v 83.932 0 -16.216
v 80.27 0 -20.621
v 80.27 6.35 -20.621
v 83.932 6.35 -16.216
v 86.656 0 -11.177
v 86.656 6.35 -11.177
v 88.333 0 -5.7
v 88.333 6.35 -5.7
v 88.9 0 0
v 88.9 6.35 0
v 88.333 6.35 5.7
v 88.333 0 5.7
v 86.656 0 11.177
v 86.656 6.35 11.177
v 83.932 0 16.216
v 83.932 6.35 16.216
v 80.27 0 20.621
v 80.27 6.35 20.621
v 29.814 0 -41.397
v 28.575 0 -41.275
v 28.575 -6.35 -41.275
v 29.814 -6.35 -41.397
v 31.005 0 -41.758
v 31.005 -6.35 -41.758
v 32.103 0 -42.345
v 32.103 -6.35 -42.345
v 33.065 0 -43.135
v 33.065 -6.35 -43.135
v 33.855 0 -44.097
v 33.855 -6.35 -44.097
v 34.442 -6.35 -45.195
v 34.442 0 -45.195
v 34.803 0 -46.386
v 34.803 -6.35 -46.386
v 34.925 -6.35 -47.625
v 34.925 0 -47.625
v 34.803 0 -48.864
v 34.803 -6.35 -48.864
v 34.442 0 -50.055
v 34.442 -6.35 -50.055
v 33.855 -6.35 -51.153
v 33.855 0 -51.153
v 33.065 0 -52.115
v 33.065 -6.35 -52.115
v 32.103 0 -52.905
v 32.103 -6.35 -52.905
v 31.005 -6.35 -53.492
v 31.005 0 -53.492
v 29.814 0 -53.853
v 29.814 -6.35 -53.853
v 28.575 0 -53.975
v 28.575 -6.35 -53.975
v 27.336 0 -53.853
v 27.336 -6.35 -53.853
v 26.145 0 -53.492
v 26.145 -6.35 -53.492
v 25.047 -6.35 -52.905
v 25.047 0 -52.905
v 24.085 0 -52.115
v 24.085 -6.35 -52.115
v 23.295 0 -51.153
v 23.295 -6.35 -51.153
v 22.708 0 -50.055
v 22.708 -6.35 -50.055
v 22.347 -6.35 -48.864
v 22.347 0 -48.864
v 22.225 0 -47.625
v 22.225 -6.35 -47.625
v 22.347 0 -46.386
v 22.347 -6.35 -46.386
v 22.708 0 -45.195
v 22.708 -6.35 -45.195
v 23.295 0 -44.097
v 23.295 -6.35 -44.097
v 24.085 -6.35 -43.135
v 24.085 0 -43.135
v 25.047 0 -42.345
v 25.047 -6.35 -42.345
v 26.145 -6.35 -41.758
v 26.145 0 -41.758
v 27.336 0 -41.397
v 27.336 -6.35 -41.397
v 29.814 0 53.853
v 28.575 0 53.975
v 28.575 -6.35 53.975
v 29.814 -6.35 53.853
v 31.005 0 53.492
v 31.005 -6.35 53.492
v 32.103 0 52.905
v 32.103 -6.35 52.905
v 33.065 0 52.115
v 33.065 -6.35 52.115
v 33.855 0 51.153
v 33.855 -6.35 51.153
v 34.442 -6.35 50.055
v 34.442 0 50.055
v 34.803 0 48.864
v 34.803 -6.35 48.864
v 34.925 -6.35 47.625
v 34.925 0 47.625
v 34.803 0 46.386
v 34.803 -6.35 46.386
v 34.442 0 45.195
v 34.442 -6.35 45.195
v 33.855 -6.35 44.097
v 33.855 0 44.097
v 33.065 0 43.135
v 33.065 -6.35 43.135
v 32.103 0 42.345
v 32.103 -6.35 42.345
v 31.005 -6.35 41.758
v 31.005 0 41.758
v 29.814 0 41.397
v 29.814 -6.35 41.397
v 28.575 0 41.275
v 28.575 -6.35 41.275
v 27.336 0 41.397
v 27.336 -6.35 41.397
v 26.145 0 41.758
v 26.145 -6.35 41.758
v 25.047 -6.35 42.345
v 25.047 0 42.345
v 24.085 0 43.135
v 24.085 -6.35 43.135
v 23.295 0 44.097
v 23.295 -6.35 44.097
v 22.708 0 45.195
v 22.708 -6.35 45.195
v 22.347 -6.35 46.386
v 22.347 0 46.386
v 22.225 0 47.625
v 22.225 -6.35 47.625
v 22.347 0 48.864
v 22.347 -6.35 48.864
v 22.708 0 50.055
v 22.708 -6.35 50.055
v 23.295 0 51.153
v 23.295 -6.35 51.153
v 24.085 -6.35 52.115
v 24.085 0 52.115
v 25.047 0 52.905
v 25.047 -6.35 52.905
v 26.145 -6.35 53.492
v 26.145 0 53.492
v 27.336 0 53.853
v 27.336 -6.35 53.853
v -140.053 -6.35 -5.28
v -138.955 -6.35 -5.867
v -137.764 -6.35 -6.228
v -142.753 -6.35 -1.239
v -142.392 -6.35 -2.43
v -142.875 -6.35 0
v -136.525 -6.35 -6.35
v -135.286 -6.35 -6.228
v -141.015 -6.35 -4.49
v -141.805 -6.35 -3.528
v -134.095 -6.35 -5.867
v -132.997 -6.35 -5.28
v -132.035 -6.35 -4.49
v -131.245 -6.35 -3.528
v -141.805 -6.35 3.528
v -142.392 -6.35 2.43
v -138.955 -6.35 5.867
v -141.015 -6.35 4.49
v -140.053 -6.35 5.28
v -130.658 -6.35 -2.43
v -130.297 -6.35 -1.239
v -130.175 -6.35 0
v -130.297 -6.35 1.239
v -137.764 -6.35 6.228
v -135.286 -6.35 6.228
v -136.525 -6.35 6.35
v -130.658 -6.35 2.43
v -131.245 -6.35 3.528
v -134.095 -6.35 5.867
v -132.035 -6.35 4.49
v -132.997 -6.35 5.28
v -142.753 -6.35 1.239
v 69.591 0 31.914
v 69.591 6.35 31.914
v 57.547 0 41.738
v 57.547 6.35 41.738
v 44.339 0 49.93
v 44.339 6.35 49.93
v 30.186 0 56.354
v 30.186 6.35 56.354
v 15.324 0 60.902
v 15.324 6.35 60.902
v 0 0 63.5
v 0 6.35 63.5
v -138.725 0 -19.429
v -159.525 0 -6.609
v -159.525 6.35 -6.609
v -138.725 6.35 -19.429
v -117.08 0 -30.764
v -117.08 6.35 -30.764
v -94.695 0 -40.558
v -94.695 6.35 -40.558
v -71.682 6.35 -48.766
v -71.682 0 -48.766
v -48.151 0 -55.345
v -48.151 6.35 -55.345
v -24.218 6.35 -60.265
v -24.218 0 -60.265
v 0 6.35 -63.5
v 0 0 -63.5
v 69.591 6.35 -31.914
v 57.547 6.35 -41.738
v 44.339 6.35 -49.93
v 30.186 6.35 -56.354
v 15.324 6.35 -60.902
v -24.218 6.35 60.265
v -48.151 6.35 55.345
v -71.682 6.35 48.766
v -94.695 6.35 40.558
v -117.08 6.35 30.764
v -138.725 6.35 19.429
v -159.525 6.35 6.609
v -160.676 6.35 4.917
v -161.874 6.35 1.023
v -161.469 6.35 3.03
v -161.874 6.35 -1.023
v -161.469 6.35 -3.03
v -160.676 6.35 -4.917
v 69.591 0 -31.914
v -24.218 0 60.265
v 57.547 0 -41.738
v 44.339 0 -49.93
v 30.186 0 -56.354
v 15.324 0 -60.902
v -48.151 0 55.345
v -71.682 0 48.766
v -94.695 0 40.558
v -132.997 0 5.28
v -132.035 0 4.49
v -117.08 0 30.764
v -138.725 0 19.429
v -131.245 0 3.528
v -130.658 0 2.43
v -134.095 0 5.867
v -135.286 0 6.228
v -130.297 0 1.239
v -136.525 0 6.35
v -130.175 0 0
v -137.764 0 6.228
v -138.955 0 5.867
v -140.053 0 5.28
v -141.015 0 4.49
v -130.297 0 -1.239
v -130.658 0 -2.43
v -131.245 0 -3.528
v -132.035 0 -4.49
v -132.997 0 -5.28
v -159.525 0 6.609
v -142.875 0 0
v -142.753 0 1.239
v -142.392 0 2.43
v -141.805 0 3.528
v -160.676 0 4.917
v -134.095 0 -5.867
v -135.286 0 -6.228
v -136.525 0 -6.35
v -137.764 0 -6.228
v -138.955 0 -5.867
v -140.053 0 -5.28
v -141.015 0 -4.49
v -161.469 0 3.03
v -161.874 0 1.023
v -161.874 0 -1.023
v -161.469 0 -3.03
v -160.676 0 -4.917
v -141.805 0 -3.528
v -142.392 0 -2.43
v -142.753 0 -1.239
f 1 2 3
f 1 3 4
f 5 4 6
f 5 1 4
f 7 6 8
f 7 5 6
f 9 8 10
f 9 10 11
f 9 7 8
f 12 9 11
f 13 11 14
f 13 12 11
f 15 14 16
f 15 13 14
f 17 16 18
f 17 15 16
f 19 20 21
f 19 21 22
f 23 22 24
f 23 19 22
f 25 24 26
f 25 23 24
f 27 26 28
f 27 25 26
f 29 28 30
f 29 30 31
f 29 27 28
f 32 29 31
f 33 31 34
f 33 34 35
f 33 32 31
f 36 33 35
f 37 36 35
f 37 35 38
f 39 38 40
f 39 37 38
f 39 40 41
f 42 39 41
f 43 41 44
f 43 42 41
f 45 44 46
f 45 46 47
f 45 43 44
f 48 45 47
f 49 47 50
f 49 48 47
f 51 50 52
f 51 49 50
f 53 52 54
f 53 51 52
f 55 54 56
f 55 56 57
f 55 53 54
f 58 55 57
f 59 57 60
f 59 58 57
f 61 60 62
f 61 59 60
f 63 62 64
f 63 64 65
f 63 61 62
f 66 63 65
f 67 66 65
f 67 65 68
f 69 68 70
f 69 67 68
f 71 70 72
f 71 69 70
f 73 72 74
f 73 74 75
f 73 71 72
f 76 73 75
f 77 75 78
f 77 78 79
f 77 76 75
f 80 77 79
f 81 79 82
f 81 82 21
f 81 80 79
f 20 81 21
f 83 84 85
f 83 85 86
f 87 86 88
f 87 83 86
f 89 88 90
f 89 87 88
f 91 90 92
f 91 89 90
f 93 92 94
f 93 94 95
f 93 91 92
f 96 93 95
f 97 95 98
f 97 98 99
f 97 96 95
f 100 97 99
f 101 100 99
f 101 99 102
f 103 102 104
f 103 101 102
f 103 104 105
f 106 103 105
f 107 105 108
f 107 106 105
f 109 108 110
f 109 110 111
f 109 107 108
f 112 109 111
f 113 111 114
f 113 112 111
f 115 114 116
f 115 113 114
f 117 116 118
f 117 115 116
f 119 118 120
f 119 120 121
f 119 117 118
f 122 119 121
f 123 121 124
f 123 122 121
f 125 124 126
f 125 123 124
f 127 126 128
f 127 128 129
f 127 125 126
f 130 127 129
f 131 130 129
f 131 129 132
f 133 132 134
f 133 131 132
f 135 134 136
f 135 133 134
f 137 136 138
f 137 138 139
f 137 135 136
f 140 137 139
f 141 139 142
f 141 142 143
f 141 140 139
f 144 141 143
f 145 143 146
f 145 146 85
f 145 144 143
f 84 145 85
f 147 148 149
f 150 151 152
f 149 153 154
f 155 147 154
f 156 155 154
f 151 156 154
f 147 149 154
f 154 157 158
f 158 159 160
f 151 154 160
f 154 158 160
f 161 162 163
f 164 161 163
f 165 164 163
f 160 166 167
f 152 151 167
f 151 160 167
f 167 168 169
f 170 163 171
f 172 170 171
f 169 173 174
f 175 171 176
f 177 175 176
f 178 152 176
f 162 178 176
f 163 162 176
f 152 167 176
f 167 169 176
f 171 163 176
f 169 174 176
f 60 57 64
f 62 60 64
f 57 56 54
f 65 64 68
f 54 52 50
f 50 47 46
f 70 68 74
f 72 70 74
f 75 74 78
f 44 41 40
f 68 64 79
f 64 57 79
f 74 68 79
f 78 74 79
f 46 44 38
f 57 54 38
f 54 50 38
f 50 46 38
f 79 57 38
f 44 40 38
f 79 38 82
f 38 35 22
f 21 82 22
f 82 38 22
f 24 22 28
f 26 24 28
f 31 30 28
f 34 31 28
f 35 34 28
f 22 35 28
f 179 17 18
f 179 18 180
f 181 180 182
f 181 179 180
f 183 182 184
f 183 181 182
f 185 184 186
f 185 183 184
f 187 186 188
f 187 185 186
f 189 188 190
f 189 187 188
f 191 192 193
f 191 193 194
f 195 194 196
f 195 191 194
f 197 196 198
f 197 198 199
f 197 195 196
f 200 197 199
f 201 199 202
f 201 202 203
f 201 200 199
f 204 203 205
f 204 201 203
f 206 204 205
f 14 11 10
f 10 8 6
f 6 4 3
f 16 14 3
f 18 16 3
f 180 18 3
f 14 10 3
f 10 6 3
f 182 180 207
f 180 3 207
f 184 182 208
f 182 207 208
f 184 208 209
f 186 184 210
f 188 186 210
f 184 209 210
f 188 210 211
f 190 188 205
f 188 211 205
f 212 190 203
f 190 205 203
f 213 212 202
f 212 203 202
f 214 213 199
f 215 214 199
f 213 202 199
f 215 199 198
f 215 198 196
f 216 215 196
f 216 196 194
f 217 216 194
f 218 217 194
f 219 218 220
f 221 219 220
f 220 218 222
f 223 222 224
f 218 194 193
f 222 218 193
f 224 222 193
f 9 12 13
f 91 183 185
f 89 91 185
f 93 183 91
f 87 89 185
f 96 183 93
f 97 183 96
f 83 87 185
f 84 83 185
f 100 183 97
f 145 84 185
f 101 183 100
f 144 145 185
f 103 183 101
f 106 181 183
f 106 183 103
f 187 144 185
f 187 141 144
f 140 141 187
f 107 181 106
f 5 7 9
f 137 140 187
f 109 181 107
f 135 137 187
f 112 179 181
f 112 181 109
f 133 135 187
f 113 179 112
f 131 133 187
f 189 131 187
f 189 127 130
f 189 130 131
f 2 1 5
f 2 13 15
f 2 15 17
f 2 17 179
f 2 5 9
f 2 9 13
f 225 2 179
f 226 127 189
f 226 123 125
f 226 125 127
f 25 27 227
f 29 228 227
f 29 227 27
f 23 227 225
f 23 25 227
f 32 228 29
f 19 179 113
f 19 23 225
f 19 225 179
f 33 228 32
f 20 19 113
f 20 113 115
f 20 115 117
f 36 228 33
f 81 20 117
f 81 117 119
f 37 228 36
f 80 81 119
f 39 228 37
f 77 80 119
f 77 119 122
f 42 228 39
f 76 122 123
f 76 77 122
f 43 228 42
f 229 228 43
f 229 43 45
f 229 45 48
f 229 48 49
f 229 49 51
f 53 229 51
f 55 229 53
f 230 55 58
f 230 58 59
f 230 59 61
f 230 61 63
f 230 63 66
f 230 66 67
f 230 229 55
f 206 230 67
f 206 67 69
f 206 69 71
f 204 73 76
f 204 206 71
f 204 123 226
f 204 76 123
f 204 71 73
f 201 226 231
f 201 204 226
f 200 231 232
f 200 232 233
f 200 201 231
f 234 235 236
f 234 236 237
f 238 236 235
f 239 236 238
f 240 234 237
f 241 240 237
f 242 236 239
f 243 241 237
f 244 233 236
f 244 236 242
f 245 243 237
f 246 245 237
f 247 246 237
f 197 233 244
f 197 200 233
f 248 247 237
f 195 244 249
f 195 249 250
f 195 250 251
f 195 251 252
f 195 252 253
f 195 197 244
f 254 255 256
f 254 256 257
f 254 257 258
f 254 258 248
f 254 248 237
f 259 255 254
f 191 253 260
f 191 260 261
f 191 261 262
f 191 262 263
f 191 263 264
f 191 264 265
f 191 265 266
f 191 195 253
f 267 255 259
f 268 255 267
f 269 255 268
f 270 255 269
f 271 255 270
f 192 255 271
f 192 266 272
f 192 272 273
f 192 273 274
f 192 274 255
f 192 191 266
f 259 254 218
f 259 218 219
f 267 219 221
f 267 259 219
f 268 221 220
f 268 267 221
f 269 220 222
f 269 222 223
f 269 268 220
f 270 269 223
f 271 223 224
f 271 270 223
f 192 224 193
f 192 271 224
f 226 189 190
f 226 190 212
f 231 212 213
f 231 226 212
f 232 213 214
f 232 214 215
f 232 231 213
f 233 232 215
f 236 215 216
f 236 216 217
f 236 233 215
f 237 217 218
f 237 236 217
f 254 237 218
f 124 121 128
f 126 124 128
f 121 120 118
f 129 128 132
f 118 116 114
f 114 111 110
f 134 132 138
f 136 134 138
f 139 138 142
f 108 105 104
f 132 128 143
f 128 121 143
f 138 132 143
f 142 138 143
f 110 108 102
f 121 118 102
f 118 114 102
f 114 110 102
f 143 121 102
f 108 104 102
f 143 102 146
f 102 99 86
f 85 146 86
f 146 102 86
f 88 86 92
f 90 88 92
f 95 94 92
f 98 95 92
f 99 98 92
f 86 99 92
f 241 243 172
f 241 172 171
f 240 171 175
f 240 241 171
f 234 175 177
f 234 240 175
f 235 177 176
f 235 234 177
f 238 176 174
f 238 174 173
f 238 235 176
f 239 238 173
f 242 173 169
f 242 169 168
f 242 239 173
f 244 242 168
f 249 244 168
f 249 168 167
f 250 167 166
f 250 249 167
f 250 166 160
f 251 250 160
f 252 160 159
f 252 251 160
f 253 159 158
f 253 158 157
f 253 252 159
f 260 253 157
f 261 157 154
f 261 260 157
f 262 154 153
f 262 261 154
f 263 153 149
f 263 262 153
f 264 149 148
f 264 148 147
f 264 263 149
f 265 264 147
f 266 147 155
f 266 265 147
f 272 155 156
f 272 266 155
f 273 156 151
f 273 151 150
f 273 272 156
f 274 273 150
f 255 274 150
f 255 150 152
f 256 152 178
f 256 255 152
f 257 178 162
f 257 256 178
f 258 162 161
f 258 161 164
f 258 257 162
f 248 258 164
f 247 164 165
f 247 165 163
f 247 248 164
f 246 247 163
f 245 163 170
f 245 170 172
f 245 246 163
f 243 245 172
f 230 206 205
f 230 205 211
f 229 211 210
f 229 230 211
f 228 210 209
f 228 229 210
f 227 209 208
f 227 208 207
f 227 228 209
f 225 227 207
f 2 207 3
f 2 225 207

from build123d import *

# Parameters (mm, degrees)
SALIENTE_EXTRUIR1_DEPTH = 6.35
SALIENTE_EXTRUIR2_START = -6.35
CROQUIS2_R              = 6.35
SALIENTE_EXTRUIR2_DEPTH = 6.35


with BuildPart() as part:
    # Croquis1 → Saliente-Extruir1 (new body)
    with BuildSketch(Plane(origin=(0, 0, 0), x_dir=(1, 0, 0), z_dir=(0, 1, 0))):
        with BuildLine():
            ThreePointArc((-159.524805442, 6.609301122), (-83.260417422, 44.863285815), (0, 63.5))
            ThreePointArc((0, 63.5), (44.339000485, 49.930204678), (80.270138251, 20.620826521))
            ThreePointArc((80.270138251, 20.620826521), (88.9, 0), (80.270138251, -20.620826521))
            ThreePointArc((80.270138251, -20.620826521), (44.339000485, -49.930204678), (0, -63.5))
            ThreePointArc((0, -63.5), (-83.260417422, -44.863285815), (-159.524805442, -6.609301122))
            ThreePointArc((-159.524805442, -6.609301122), (-161.925, 0), (-159.524805442, 6.609301122))
        make_face()
    extrude(amount=SALIENTE_EXTRUIR1_DEPTH)

    # Croquis2 → Saliente-Extruir2 (add)
    with BuildSketch(Plane(origin=(0, 6.35, 0), x_dir=(1, 0, 0), z_dir=(0, 1, 0)).offset(SALIENTE_EXTRUIR2_START)):
        with Locations(Location((28.575, 47.625, 0), (0, 0, 270))):
            Circle(CROQUIS2_R)
        with Locations(Location((28.575, -47.625, 0), (0, 0, 270))):
            Circle(CROQUIS2_R)
        with Locations(Location((-136.525, 0, 0), (0, 0, 270))):
            Circle(CROQUIS2_R)
    extrude(amount=-SALIENTE_EXTRUIR2_DEPTH)


solid = part.part
